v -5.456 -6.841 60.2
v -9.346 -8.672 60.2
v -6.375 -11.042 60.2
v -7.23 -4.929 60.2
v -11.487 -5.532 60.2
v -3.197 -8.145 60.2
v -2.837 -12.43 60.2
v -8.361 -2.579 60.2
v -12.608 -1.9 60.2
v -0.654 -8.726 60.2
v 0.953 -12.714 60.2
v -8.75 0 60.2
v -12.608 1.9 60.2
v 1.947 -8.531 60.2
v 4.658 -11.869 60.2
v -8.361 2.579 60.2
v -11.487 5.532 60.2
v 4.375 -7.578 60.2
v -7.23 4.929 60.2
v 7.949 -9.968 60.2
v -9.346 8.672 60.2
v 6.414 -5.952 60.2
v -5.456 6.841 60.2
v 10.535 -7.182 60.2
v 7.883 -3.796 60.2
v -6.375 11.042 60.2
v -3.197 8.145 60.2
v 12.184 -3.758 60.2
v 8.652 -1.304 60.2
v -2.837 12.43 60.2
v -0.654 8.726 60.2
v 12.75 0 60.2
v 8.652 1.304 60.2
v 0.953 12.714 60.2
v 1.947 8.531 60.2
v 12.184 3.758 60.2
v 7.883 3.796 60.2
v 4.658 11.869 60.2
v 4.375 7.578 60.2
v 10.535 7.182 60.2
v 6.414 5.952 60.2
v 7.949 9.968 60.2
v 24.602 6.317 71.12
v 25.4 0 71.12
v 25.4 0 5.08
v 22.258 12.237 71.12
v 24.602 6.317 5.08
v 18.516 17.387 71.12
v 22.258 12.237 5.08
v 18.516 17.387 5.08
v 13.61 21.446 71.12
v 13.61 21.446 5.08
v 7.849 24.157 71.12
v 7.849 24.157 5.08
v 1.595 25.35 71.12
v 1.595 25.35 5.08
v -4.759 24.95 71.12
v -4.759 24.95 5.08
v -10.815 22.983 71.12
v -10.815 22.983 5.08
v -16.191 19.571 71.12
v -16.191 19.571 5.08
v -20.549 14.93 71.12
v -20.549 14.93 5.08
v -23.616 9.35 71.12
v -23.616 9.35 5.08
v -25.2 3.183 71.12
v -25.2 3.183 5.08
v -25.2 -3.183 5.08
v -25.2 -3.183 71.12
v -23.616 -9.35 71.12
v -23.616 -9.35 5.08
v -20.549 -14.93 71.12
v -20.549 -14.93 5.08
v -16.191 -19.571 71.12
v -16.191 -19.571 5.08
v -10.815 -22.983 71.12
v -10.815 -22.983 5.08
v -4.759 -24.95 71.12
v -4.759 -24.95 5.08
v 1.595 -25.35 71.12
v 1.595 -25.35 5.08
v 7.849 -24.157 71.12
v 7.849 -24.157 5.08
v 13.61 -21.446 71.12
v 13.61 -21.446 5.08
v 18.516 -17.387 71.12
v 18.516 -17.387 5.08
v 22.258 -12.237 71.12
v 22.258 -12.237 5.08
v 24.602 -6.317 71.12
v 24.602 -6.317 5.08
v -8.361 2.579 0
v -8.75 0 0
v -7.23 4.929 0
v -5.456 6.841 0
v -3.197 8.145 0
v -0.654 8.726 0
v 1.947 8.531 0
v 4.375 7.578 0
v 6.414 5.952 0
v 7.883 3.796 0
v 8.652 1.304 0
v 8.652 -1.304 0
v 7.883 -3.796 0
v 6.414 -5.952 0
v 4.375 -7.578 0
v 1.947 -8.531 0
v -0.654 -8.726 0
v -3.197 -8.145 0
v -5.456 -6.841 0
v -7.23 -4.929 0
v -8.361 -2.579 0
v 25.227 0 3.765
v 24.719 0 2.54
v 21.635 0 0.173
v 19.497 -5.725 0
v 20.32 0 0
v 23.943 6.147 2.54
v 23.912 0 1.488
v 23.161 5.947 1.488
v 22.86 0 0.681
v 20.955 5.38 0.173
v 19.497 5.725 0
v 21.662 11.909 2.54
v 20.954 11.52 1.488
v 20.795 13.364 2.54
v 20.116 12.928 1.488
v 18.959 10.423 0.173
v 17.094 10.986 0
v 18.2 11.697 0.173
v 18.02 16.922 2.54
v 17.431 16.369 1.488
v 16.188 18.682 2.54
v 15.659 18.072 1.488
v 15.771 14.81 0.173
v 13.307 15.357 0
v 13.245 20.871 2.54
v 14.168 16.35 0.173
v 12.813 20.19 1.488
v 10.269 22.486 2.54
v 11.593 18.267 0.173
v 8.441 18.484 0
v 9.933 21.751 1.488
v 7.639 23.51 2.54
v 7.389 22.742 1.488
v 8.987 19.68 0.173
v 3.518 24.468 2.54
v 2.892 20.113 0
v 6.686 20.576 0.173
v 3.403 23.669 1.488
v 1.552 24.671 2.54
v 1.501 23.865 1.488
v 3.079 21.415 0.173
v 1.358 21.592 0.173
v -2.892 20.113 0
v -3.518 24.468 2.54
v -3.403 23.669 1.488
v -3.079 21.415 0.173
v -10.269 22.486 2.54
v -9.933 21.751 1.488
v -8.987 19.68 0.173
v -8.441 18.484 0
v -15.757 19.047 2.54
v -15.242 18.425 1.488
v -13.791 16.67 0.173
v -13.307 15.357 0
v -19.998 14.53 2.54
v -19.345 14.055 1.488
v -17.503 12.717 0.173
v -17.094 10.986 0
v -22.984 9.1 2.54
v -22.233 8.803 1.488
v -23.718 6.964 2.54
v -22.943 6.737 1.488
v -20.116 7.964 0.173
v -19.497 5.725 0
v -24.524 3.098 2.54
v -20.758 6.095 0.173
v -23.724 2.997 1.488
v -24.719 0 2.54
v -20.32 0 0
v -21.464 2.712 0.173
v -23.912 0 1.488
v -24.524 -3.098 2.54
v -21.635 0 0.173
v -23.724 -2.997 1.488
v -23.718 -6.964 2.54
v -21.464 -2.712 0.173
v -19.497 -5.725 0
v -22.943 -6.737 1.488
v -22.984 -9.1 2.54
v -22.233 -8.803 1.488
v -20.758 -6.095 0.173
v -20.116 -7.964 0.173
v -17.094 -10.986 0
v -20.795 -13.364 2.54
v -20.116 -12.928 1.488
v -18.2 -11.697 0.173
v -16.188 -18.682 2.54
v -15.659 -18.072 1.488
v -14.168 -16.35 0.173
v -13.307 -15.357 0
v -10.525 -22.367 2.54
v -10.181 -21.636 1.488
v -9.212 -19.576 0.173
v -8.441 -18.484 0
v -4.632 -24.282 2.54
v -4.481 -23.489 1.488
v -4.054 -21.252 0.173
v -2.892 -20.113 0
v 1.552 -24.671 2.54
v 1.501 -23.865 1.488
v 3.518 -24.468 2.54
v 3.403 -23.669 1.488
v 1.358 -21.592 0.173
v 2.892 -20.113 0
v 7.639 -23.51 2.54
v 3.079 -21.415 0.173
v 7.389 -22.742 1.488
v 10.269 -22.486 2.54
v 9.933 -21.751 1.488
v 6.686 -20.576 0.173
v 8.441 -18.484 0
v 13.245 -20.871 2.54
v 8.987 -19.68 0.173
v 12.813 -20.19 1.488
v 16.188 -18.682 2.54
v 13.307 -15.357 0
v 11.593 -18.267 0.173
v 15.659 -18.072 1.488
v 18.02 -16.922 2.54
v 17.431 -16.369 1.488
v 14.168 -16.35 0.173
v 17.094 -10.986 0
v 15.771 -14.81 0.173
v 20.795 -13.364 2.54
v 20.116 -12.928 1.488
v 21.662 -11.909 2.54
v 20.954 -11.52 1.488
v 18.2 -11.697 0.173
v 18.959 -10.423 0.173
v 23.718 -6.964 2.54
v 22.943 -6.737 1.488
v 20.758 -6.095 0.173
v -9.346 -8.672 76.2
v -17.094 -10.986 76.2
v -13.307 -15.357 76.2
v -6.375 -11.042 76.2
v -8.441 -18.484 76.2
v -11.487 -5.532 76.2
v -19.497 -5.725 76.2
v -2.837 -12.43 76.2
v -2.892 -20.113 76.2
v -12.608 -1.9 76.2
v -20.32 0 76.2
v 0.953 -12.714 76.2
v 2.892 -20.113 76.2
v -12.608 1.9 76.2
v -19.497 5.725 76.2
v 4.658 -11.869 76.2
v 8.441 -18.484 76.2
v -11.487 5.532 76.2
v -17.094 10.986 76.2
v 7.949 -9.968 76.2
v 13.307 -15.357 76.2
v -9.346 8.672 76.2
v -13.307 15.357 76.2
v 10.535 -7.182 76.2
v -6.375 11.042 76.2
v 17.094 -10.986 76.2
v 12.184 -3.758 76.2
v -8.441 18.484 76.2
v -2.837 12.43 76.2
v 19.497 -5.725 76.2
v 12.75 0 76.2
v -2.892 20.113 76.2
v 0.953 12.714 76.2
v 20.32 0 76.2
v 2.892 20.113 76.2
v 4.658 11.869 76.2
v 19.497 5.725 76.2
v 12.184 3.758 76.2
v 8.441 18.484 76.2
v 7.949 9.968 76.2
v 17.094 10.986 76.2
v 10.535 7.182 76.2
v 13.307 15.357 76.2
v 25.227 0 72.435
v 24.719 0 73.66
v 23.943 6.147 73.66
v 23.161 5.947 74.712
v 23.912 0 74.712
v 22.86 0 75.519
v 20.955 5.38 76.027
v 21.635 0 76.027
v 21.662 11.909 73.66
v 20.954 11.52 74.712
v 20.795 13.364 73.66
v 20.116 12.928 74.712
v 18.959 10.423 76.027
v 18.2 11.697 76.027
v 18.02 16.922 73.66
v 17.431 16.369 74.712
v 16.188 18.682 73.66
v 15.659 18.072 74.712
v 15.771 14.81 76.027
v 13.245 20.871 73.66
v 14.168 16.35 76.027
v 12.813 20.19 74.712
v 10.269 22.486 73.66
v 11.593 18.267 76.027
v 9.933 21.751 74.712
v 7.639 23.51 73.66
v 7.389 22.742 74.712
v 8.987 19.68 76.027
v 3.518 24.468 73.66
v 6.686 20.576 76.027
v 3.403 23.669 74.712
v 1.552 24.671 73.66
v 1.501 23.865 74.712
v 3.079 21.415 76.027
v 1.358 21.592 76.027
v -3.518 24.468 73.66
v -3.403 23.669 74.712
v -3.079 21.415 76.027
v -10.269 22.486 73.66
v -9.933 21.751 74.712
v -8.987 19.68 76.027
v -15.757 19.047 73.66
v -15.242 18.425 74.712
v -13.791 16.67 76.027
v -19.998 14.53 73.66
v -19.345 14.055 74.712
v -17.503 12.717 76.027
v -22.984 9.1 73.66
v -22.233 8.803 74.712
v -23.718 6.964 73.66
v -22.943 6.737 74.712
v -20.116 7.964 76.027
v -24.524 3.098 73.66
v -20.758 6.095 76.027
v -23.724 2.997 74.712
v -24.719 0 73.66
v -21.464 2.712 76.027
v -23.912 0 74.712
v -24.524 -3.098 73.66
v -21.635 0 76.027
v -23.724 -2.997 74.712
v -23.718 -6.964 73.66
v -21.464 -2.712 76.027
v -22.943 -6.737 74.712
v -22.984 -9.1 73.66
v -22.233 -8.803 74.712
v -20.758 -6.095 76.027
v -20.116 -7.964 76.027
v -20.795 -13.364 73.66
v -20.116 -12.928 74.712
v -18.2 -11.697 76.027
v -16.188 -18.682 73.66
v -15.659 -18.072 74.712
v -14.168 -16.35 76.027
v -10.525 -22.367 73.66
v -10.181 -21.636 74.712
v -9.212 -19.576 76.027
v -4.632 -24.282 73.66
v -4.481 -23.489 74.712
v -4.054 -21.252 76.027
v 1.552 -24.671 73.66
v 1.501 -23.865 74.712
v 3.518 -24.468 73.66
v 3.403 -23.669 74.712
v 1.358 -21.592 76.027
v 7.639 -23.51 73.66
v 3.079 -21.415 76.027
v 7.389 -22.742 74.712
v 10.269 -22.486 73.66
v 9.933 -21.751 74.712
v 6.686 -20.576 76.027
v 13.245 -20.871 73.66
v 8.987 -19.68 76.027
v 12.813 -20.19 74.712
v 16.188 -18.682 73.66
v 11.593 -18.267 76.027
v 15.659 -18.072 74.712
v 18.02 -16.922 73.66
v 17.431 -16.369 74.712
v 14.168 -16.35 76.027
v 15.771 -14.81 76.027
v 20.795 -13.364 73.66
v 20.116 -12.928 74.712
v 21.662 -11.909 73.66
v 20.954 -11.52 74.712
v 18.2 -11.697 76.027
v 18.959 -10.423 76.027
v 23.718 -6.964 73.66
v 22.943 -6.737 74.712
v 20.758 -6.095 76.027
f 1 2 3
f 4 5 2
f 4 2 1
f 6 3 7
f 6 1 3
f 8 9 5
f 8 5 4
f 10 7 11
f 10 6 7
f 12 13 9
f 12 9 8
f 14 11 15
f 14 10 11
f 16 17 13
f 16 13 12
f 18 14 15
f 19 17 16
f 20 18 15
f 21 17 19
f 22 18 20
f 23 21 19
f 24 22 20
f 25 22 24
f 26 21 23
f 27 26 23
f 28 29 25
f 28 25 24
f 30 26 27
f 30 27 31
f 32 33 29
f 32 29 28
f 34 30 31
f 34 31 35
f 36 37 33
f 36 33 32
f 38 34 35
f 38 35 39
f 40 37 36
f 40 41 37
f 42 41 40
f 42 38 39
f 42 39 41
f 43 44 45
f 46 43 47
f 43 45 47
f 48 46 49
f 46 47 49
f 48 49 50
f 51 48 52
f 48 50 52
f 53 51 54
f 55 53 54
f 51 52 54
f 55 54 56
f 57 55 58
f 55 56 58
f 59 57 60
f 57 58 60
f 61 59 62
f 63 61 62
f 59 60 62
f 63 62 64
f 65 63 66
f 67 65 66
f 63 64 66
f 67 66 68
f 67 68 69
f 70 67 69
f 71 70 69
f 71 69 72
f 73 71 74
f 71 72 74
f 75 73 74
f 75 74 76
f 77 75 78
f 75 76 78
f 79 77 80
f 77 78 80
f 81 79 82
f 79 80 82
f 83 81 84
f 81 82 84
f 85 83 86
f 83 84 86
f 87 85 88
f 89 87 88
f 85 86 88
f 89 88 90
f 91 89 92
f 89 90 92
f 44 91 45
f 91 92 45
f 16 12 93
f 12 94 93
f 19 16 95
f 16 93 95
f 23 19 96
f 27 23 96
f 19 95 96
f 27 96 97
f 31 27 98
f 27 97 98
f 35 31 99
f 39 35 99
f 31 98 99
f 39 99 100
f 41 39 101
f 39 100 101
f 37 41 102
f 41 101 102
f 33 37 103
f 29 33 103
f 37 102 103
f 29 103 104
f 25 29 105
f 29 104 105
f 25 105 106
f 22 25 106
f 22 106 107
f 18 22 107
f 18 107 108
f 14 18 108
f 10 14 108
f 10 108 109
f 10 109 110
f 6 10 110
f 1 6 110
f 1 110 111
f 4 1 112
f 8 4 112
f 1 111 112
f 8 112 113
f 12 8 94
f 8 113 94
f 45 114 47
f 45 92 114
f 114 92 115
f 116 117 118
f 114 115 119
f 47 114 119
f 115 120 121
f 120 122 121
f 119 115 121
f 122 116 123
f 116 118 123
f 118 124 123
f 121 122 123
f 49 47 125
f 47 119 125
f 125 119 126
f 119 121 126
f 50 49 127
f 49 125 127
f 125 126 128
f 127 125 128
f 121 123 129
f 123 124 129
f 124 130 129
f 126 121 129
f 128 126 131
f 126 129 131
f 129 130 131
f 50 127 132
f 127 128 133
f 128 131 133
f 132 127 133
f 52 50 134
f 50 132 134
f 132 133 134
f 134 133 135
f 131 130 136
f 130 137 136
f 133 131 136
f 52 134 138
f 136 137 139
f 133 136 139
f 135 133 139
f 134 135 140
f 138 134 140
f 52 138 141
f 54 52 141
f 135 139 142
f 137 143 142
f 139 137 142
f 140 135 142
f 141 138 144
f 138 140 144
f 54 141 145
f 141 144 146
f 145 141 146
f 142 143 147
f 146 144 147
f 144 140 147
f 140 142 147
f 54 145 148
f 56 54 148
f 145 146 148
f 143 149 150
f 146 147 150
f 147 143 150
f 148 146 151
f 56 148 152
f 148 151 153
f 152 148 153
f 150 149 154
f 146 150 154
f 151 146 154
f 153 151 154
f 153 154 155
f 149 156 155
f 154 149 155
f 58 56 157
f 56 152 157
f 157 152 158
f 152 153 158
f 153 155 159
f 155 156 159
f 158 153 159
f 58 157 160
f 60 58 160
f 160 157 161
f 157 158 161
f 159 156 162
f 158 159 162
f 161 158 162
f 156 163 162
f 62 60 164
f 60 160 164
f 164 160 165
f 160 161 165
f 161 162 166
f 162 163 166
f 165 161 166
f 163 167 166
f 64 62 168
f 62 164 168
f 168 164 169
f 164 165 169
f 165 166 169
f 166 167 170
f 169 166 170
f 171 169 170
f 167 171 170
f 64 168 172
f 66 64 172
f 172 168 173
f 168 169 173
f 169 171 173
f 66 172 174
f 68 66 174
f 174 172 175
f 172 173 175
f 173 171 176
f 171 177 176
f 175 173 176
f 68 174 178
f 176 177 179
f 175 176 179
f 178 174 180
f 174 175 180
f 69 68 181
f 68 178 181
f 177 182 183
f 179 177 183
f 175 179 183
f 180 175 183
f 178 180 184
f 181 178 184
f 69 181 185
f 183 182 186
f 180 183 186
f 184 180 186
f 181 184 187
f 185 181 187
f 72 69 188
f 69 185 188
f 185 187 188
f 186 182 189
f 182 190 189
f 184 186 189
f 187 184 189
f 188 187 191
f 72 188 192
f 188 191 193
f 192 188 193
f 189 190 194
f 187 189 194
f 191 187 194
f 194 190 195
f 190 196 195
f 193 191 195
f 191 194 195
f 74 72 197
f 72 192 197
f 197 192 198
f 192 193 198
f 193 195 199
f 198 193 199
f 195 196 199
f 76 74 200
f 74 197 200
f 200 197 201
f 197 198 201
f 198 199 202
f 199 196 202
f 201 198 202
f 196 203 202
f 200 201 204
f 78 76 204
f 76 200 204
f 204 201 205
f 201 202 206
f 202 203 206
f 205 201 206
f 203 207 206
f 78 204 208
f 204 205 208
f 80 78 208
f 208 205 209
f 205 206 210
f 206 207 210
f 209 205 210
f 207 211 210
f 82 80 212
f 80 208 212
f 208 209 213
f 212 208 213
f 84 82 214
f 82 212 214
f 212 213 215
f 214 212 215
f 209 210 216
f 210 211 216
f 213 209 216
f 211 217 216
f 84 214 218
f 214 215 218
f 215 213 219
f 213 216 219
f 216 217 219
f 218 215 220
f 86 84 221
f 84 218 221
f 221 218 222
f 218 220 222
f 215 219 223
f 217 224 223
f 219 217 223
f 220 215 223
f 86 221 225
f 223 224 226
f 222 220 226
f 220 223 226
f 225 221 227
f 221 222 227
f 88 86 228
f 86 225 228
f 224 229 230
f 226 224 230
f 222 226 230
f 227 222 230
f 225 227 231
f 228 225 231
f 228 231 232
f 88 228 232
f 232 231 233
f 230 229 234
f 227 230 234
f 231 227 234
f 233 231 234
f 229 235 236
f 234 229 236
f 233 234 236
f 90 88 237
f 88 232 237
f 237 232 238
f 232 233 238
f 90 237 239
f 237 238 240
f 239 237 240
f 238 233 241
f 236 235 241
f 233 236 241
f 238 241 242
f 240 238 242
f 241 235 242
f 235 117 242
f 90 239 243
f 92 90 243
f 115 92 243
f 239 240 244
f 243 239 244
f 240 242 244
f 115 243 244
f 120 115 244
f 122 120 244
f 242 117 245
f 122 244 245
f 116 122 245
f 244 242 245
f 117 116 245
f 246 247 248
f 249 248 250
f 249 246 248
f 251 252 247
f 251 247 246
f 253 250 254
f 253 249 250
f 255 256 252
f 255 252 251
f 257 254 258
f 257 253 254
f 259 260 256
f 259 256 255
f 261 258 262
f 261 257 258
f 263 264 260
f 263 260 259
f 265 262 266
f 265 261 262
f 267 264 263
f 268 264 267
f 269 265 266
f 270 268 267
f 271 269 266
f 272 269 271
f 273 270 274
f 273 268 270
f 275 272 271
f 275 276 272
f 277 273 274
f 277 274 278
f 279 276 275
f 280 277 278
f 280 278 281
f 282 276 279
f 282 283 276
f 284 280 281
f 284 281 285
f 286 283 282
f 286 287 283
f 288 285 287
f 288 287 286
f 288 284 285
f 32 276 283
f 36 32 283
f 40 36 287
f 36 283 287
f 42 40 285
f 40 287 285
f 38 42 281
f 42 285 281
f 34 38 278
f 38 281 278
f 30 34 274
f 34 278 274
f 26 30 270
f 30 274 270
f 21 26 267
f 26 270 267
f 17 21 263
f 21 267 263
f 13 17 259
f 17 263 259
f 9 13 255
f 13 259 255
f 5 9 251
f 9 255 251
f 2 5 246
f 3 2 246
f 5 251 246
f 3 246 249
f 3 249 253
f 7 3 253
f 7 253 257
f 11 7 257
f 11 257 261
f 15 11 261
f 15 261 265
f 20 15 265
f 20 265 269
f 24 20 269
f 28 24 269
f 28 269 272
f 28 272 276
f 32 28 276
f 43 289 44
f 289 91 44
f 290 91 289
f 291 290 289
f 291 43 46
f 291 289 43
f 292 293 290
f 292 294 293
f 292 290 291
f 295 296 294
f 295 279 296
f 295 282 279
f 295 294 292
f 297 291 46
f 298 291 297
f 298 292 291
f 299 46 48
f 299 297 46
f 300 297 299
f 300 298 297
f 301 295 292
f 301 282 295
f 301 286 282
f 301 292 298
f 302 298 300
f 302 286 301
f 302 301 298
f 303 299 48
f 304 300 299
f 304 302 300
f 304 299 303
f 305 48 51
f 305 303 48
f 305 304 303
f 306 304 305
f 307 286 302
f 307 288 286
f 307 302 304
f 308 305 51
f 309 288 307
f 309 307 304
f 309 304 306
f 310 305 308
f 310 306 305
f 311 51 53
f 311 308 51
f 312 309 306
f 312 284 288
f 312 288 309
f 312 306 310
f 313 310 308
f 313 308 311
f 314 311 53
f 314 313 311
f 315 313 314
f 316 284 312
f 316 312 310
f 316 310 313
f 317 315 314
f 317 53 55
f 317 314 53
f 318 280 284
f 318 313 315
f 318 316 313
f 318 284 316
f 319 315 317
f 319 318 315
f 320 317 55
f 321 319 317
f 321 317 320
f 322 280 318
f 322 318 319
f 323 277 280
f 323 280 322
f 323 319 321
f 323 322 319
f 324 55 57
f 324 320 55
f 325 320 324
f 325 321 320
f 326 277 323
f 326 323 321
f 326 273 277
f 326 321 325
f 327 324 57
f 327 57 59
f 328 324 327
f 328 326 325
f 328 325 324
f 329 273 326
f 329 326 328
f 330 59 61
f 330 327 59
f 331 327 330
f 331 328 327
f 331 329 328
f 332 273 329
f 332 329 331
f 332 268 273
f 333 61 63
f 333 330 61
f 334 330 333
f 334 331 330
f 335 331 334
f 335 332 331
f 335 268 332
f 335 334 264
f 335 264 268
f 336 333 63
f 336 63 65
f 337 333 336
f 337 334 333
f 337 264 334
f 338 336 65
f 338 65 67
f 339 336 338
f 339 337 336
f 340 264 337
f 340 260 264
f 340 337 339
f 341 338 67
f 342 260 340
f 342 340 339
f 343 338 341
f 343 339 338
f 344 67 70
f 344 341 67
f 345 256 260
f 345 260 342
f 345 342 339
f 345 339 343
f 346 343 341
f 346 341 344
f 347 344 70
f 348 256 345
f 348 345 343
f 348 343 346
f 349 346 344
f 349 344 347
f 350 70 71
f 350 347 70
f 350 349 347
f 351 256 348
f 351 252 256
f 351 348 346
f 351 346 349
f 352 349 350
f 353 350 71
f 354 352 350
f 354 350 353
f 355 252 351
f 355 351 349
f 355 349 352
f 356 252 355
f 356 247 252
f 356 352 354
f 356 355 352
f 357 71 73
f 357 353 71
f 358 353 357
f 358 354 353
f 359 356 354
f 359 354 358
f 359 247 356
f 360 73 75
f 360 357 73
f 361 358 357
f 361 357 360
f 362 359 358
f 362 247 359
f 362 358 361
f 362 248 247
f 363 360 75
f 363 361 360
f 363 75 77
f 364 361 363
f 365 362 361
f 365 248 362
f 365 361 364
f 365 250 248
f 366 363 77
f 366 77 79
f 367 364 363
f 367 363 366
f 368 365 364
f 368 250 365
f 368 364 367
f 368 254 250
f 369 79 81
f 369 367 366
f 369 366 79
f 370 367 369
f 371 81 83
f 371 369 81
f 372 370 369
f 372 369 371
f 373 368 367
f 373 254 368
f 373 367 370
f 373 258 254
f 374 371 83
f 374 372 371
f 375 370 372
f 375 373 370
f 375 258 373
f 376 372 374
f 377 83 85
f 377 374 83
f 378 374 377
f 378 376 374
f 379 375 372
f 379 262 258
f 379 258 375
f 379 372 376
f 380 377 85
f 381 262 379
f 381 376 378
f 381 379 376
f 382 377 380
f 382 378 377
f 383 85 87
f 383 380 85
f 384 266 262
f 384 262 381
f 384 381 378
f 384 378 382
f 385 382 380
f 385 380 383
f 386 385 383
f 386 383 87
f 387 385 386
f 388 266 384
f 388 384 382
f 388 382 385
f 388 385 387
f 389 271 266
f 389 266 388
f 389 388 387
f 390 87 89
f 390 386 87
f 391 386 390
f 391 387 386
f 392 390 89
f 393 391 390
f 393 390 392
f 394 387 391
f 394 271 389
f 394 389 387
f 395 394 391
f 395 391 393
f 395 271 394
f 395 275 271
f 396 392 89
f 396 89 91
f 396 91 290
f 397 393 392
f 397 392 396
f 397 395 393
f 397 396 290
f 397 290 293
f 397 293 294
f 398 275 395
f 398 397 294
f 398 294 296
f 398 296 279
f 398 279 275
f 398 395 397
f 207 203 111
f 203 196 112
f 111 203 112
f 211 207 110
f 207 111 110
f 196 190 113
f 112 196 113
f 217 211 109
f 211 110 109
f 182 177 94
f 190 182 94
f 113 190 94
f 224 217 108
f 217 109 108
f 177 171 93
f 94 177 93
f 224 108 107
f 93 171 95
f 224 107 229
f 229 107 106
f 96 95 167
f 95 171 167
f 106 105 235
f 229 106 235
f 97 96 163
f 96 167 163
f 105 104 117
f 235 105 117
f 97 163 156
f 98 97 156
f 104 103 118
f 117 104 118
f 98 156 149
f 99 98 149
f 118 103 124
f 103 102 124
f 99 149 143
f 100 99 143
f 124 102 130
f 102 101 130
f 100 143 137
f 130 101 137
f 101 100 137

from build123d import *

# Parameters (mm, degrees)
F0_R           = 25.4
F1_DEPTH       = 76.2
F3_D           = 17.5
F3_CBORE_D     = 25.5
F3_CBORE_DEPTH = 16
F4_R           = 5.08


with BuildPart() as f1:
    # F0 (on Top) → F1 (new body)
    with BuildSketch(Plane.XY):
        Circle(F0_R)
    extrude(amount=F1_DEPTH)

    # F3 (through all)
    with Locations(Plane.XY.offset(76.2)):
        with Locations((0, 0)):
            CounterBoreHole(F3_D / 2, F3_CBORE_D / 2, F3_CBORE_DEPTH)

    # F4
    f4_edges = [f1.edges().sort_by_distance(p)[0] for p in [
        (-25.4, 0, 76.2),
        (-25.4, 0, 0),
    ]]
    fillet(f4_edges, radius=F4_R)


solid = f1.part
